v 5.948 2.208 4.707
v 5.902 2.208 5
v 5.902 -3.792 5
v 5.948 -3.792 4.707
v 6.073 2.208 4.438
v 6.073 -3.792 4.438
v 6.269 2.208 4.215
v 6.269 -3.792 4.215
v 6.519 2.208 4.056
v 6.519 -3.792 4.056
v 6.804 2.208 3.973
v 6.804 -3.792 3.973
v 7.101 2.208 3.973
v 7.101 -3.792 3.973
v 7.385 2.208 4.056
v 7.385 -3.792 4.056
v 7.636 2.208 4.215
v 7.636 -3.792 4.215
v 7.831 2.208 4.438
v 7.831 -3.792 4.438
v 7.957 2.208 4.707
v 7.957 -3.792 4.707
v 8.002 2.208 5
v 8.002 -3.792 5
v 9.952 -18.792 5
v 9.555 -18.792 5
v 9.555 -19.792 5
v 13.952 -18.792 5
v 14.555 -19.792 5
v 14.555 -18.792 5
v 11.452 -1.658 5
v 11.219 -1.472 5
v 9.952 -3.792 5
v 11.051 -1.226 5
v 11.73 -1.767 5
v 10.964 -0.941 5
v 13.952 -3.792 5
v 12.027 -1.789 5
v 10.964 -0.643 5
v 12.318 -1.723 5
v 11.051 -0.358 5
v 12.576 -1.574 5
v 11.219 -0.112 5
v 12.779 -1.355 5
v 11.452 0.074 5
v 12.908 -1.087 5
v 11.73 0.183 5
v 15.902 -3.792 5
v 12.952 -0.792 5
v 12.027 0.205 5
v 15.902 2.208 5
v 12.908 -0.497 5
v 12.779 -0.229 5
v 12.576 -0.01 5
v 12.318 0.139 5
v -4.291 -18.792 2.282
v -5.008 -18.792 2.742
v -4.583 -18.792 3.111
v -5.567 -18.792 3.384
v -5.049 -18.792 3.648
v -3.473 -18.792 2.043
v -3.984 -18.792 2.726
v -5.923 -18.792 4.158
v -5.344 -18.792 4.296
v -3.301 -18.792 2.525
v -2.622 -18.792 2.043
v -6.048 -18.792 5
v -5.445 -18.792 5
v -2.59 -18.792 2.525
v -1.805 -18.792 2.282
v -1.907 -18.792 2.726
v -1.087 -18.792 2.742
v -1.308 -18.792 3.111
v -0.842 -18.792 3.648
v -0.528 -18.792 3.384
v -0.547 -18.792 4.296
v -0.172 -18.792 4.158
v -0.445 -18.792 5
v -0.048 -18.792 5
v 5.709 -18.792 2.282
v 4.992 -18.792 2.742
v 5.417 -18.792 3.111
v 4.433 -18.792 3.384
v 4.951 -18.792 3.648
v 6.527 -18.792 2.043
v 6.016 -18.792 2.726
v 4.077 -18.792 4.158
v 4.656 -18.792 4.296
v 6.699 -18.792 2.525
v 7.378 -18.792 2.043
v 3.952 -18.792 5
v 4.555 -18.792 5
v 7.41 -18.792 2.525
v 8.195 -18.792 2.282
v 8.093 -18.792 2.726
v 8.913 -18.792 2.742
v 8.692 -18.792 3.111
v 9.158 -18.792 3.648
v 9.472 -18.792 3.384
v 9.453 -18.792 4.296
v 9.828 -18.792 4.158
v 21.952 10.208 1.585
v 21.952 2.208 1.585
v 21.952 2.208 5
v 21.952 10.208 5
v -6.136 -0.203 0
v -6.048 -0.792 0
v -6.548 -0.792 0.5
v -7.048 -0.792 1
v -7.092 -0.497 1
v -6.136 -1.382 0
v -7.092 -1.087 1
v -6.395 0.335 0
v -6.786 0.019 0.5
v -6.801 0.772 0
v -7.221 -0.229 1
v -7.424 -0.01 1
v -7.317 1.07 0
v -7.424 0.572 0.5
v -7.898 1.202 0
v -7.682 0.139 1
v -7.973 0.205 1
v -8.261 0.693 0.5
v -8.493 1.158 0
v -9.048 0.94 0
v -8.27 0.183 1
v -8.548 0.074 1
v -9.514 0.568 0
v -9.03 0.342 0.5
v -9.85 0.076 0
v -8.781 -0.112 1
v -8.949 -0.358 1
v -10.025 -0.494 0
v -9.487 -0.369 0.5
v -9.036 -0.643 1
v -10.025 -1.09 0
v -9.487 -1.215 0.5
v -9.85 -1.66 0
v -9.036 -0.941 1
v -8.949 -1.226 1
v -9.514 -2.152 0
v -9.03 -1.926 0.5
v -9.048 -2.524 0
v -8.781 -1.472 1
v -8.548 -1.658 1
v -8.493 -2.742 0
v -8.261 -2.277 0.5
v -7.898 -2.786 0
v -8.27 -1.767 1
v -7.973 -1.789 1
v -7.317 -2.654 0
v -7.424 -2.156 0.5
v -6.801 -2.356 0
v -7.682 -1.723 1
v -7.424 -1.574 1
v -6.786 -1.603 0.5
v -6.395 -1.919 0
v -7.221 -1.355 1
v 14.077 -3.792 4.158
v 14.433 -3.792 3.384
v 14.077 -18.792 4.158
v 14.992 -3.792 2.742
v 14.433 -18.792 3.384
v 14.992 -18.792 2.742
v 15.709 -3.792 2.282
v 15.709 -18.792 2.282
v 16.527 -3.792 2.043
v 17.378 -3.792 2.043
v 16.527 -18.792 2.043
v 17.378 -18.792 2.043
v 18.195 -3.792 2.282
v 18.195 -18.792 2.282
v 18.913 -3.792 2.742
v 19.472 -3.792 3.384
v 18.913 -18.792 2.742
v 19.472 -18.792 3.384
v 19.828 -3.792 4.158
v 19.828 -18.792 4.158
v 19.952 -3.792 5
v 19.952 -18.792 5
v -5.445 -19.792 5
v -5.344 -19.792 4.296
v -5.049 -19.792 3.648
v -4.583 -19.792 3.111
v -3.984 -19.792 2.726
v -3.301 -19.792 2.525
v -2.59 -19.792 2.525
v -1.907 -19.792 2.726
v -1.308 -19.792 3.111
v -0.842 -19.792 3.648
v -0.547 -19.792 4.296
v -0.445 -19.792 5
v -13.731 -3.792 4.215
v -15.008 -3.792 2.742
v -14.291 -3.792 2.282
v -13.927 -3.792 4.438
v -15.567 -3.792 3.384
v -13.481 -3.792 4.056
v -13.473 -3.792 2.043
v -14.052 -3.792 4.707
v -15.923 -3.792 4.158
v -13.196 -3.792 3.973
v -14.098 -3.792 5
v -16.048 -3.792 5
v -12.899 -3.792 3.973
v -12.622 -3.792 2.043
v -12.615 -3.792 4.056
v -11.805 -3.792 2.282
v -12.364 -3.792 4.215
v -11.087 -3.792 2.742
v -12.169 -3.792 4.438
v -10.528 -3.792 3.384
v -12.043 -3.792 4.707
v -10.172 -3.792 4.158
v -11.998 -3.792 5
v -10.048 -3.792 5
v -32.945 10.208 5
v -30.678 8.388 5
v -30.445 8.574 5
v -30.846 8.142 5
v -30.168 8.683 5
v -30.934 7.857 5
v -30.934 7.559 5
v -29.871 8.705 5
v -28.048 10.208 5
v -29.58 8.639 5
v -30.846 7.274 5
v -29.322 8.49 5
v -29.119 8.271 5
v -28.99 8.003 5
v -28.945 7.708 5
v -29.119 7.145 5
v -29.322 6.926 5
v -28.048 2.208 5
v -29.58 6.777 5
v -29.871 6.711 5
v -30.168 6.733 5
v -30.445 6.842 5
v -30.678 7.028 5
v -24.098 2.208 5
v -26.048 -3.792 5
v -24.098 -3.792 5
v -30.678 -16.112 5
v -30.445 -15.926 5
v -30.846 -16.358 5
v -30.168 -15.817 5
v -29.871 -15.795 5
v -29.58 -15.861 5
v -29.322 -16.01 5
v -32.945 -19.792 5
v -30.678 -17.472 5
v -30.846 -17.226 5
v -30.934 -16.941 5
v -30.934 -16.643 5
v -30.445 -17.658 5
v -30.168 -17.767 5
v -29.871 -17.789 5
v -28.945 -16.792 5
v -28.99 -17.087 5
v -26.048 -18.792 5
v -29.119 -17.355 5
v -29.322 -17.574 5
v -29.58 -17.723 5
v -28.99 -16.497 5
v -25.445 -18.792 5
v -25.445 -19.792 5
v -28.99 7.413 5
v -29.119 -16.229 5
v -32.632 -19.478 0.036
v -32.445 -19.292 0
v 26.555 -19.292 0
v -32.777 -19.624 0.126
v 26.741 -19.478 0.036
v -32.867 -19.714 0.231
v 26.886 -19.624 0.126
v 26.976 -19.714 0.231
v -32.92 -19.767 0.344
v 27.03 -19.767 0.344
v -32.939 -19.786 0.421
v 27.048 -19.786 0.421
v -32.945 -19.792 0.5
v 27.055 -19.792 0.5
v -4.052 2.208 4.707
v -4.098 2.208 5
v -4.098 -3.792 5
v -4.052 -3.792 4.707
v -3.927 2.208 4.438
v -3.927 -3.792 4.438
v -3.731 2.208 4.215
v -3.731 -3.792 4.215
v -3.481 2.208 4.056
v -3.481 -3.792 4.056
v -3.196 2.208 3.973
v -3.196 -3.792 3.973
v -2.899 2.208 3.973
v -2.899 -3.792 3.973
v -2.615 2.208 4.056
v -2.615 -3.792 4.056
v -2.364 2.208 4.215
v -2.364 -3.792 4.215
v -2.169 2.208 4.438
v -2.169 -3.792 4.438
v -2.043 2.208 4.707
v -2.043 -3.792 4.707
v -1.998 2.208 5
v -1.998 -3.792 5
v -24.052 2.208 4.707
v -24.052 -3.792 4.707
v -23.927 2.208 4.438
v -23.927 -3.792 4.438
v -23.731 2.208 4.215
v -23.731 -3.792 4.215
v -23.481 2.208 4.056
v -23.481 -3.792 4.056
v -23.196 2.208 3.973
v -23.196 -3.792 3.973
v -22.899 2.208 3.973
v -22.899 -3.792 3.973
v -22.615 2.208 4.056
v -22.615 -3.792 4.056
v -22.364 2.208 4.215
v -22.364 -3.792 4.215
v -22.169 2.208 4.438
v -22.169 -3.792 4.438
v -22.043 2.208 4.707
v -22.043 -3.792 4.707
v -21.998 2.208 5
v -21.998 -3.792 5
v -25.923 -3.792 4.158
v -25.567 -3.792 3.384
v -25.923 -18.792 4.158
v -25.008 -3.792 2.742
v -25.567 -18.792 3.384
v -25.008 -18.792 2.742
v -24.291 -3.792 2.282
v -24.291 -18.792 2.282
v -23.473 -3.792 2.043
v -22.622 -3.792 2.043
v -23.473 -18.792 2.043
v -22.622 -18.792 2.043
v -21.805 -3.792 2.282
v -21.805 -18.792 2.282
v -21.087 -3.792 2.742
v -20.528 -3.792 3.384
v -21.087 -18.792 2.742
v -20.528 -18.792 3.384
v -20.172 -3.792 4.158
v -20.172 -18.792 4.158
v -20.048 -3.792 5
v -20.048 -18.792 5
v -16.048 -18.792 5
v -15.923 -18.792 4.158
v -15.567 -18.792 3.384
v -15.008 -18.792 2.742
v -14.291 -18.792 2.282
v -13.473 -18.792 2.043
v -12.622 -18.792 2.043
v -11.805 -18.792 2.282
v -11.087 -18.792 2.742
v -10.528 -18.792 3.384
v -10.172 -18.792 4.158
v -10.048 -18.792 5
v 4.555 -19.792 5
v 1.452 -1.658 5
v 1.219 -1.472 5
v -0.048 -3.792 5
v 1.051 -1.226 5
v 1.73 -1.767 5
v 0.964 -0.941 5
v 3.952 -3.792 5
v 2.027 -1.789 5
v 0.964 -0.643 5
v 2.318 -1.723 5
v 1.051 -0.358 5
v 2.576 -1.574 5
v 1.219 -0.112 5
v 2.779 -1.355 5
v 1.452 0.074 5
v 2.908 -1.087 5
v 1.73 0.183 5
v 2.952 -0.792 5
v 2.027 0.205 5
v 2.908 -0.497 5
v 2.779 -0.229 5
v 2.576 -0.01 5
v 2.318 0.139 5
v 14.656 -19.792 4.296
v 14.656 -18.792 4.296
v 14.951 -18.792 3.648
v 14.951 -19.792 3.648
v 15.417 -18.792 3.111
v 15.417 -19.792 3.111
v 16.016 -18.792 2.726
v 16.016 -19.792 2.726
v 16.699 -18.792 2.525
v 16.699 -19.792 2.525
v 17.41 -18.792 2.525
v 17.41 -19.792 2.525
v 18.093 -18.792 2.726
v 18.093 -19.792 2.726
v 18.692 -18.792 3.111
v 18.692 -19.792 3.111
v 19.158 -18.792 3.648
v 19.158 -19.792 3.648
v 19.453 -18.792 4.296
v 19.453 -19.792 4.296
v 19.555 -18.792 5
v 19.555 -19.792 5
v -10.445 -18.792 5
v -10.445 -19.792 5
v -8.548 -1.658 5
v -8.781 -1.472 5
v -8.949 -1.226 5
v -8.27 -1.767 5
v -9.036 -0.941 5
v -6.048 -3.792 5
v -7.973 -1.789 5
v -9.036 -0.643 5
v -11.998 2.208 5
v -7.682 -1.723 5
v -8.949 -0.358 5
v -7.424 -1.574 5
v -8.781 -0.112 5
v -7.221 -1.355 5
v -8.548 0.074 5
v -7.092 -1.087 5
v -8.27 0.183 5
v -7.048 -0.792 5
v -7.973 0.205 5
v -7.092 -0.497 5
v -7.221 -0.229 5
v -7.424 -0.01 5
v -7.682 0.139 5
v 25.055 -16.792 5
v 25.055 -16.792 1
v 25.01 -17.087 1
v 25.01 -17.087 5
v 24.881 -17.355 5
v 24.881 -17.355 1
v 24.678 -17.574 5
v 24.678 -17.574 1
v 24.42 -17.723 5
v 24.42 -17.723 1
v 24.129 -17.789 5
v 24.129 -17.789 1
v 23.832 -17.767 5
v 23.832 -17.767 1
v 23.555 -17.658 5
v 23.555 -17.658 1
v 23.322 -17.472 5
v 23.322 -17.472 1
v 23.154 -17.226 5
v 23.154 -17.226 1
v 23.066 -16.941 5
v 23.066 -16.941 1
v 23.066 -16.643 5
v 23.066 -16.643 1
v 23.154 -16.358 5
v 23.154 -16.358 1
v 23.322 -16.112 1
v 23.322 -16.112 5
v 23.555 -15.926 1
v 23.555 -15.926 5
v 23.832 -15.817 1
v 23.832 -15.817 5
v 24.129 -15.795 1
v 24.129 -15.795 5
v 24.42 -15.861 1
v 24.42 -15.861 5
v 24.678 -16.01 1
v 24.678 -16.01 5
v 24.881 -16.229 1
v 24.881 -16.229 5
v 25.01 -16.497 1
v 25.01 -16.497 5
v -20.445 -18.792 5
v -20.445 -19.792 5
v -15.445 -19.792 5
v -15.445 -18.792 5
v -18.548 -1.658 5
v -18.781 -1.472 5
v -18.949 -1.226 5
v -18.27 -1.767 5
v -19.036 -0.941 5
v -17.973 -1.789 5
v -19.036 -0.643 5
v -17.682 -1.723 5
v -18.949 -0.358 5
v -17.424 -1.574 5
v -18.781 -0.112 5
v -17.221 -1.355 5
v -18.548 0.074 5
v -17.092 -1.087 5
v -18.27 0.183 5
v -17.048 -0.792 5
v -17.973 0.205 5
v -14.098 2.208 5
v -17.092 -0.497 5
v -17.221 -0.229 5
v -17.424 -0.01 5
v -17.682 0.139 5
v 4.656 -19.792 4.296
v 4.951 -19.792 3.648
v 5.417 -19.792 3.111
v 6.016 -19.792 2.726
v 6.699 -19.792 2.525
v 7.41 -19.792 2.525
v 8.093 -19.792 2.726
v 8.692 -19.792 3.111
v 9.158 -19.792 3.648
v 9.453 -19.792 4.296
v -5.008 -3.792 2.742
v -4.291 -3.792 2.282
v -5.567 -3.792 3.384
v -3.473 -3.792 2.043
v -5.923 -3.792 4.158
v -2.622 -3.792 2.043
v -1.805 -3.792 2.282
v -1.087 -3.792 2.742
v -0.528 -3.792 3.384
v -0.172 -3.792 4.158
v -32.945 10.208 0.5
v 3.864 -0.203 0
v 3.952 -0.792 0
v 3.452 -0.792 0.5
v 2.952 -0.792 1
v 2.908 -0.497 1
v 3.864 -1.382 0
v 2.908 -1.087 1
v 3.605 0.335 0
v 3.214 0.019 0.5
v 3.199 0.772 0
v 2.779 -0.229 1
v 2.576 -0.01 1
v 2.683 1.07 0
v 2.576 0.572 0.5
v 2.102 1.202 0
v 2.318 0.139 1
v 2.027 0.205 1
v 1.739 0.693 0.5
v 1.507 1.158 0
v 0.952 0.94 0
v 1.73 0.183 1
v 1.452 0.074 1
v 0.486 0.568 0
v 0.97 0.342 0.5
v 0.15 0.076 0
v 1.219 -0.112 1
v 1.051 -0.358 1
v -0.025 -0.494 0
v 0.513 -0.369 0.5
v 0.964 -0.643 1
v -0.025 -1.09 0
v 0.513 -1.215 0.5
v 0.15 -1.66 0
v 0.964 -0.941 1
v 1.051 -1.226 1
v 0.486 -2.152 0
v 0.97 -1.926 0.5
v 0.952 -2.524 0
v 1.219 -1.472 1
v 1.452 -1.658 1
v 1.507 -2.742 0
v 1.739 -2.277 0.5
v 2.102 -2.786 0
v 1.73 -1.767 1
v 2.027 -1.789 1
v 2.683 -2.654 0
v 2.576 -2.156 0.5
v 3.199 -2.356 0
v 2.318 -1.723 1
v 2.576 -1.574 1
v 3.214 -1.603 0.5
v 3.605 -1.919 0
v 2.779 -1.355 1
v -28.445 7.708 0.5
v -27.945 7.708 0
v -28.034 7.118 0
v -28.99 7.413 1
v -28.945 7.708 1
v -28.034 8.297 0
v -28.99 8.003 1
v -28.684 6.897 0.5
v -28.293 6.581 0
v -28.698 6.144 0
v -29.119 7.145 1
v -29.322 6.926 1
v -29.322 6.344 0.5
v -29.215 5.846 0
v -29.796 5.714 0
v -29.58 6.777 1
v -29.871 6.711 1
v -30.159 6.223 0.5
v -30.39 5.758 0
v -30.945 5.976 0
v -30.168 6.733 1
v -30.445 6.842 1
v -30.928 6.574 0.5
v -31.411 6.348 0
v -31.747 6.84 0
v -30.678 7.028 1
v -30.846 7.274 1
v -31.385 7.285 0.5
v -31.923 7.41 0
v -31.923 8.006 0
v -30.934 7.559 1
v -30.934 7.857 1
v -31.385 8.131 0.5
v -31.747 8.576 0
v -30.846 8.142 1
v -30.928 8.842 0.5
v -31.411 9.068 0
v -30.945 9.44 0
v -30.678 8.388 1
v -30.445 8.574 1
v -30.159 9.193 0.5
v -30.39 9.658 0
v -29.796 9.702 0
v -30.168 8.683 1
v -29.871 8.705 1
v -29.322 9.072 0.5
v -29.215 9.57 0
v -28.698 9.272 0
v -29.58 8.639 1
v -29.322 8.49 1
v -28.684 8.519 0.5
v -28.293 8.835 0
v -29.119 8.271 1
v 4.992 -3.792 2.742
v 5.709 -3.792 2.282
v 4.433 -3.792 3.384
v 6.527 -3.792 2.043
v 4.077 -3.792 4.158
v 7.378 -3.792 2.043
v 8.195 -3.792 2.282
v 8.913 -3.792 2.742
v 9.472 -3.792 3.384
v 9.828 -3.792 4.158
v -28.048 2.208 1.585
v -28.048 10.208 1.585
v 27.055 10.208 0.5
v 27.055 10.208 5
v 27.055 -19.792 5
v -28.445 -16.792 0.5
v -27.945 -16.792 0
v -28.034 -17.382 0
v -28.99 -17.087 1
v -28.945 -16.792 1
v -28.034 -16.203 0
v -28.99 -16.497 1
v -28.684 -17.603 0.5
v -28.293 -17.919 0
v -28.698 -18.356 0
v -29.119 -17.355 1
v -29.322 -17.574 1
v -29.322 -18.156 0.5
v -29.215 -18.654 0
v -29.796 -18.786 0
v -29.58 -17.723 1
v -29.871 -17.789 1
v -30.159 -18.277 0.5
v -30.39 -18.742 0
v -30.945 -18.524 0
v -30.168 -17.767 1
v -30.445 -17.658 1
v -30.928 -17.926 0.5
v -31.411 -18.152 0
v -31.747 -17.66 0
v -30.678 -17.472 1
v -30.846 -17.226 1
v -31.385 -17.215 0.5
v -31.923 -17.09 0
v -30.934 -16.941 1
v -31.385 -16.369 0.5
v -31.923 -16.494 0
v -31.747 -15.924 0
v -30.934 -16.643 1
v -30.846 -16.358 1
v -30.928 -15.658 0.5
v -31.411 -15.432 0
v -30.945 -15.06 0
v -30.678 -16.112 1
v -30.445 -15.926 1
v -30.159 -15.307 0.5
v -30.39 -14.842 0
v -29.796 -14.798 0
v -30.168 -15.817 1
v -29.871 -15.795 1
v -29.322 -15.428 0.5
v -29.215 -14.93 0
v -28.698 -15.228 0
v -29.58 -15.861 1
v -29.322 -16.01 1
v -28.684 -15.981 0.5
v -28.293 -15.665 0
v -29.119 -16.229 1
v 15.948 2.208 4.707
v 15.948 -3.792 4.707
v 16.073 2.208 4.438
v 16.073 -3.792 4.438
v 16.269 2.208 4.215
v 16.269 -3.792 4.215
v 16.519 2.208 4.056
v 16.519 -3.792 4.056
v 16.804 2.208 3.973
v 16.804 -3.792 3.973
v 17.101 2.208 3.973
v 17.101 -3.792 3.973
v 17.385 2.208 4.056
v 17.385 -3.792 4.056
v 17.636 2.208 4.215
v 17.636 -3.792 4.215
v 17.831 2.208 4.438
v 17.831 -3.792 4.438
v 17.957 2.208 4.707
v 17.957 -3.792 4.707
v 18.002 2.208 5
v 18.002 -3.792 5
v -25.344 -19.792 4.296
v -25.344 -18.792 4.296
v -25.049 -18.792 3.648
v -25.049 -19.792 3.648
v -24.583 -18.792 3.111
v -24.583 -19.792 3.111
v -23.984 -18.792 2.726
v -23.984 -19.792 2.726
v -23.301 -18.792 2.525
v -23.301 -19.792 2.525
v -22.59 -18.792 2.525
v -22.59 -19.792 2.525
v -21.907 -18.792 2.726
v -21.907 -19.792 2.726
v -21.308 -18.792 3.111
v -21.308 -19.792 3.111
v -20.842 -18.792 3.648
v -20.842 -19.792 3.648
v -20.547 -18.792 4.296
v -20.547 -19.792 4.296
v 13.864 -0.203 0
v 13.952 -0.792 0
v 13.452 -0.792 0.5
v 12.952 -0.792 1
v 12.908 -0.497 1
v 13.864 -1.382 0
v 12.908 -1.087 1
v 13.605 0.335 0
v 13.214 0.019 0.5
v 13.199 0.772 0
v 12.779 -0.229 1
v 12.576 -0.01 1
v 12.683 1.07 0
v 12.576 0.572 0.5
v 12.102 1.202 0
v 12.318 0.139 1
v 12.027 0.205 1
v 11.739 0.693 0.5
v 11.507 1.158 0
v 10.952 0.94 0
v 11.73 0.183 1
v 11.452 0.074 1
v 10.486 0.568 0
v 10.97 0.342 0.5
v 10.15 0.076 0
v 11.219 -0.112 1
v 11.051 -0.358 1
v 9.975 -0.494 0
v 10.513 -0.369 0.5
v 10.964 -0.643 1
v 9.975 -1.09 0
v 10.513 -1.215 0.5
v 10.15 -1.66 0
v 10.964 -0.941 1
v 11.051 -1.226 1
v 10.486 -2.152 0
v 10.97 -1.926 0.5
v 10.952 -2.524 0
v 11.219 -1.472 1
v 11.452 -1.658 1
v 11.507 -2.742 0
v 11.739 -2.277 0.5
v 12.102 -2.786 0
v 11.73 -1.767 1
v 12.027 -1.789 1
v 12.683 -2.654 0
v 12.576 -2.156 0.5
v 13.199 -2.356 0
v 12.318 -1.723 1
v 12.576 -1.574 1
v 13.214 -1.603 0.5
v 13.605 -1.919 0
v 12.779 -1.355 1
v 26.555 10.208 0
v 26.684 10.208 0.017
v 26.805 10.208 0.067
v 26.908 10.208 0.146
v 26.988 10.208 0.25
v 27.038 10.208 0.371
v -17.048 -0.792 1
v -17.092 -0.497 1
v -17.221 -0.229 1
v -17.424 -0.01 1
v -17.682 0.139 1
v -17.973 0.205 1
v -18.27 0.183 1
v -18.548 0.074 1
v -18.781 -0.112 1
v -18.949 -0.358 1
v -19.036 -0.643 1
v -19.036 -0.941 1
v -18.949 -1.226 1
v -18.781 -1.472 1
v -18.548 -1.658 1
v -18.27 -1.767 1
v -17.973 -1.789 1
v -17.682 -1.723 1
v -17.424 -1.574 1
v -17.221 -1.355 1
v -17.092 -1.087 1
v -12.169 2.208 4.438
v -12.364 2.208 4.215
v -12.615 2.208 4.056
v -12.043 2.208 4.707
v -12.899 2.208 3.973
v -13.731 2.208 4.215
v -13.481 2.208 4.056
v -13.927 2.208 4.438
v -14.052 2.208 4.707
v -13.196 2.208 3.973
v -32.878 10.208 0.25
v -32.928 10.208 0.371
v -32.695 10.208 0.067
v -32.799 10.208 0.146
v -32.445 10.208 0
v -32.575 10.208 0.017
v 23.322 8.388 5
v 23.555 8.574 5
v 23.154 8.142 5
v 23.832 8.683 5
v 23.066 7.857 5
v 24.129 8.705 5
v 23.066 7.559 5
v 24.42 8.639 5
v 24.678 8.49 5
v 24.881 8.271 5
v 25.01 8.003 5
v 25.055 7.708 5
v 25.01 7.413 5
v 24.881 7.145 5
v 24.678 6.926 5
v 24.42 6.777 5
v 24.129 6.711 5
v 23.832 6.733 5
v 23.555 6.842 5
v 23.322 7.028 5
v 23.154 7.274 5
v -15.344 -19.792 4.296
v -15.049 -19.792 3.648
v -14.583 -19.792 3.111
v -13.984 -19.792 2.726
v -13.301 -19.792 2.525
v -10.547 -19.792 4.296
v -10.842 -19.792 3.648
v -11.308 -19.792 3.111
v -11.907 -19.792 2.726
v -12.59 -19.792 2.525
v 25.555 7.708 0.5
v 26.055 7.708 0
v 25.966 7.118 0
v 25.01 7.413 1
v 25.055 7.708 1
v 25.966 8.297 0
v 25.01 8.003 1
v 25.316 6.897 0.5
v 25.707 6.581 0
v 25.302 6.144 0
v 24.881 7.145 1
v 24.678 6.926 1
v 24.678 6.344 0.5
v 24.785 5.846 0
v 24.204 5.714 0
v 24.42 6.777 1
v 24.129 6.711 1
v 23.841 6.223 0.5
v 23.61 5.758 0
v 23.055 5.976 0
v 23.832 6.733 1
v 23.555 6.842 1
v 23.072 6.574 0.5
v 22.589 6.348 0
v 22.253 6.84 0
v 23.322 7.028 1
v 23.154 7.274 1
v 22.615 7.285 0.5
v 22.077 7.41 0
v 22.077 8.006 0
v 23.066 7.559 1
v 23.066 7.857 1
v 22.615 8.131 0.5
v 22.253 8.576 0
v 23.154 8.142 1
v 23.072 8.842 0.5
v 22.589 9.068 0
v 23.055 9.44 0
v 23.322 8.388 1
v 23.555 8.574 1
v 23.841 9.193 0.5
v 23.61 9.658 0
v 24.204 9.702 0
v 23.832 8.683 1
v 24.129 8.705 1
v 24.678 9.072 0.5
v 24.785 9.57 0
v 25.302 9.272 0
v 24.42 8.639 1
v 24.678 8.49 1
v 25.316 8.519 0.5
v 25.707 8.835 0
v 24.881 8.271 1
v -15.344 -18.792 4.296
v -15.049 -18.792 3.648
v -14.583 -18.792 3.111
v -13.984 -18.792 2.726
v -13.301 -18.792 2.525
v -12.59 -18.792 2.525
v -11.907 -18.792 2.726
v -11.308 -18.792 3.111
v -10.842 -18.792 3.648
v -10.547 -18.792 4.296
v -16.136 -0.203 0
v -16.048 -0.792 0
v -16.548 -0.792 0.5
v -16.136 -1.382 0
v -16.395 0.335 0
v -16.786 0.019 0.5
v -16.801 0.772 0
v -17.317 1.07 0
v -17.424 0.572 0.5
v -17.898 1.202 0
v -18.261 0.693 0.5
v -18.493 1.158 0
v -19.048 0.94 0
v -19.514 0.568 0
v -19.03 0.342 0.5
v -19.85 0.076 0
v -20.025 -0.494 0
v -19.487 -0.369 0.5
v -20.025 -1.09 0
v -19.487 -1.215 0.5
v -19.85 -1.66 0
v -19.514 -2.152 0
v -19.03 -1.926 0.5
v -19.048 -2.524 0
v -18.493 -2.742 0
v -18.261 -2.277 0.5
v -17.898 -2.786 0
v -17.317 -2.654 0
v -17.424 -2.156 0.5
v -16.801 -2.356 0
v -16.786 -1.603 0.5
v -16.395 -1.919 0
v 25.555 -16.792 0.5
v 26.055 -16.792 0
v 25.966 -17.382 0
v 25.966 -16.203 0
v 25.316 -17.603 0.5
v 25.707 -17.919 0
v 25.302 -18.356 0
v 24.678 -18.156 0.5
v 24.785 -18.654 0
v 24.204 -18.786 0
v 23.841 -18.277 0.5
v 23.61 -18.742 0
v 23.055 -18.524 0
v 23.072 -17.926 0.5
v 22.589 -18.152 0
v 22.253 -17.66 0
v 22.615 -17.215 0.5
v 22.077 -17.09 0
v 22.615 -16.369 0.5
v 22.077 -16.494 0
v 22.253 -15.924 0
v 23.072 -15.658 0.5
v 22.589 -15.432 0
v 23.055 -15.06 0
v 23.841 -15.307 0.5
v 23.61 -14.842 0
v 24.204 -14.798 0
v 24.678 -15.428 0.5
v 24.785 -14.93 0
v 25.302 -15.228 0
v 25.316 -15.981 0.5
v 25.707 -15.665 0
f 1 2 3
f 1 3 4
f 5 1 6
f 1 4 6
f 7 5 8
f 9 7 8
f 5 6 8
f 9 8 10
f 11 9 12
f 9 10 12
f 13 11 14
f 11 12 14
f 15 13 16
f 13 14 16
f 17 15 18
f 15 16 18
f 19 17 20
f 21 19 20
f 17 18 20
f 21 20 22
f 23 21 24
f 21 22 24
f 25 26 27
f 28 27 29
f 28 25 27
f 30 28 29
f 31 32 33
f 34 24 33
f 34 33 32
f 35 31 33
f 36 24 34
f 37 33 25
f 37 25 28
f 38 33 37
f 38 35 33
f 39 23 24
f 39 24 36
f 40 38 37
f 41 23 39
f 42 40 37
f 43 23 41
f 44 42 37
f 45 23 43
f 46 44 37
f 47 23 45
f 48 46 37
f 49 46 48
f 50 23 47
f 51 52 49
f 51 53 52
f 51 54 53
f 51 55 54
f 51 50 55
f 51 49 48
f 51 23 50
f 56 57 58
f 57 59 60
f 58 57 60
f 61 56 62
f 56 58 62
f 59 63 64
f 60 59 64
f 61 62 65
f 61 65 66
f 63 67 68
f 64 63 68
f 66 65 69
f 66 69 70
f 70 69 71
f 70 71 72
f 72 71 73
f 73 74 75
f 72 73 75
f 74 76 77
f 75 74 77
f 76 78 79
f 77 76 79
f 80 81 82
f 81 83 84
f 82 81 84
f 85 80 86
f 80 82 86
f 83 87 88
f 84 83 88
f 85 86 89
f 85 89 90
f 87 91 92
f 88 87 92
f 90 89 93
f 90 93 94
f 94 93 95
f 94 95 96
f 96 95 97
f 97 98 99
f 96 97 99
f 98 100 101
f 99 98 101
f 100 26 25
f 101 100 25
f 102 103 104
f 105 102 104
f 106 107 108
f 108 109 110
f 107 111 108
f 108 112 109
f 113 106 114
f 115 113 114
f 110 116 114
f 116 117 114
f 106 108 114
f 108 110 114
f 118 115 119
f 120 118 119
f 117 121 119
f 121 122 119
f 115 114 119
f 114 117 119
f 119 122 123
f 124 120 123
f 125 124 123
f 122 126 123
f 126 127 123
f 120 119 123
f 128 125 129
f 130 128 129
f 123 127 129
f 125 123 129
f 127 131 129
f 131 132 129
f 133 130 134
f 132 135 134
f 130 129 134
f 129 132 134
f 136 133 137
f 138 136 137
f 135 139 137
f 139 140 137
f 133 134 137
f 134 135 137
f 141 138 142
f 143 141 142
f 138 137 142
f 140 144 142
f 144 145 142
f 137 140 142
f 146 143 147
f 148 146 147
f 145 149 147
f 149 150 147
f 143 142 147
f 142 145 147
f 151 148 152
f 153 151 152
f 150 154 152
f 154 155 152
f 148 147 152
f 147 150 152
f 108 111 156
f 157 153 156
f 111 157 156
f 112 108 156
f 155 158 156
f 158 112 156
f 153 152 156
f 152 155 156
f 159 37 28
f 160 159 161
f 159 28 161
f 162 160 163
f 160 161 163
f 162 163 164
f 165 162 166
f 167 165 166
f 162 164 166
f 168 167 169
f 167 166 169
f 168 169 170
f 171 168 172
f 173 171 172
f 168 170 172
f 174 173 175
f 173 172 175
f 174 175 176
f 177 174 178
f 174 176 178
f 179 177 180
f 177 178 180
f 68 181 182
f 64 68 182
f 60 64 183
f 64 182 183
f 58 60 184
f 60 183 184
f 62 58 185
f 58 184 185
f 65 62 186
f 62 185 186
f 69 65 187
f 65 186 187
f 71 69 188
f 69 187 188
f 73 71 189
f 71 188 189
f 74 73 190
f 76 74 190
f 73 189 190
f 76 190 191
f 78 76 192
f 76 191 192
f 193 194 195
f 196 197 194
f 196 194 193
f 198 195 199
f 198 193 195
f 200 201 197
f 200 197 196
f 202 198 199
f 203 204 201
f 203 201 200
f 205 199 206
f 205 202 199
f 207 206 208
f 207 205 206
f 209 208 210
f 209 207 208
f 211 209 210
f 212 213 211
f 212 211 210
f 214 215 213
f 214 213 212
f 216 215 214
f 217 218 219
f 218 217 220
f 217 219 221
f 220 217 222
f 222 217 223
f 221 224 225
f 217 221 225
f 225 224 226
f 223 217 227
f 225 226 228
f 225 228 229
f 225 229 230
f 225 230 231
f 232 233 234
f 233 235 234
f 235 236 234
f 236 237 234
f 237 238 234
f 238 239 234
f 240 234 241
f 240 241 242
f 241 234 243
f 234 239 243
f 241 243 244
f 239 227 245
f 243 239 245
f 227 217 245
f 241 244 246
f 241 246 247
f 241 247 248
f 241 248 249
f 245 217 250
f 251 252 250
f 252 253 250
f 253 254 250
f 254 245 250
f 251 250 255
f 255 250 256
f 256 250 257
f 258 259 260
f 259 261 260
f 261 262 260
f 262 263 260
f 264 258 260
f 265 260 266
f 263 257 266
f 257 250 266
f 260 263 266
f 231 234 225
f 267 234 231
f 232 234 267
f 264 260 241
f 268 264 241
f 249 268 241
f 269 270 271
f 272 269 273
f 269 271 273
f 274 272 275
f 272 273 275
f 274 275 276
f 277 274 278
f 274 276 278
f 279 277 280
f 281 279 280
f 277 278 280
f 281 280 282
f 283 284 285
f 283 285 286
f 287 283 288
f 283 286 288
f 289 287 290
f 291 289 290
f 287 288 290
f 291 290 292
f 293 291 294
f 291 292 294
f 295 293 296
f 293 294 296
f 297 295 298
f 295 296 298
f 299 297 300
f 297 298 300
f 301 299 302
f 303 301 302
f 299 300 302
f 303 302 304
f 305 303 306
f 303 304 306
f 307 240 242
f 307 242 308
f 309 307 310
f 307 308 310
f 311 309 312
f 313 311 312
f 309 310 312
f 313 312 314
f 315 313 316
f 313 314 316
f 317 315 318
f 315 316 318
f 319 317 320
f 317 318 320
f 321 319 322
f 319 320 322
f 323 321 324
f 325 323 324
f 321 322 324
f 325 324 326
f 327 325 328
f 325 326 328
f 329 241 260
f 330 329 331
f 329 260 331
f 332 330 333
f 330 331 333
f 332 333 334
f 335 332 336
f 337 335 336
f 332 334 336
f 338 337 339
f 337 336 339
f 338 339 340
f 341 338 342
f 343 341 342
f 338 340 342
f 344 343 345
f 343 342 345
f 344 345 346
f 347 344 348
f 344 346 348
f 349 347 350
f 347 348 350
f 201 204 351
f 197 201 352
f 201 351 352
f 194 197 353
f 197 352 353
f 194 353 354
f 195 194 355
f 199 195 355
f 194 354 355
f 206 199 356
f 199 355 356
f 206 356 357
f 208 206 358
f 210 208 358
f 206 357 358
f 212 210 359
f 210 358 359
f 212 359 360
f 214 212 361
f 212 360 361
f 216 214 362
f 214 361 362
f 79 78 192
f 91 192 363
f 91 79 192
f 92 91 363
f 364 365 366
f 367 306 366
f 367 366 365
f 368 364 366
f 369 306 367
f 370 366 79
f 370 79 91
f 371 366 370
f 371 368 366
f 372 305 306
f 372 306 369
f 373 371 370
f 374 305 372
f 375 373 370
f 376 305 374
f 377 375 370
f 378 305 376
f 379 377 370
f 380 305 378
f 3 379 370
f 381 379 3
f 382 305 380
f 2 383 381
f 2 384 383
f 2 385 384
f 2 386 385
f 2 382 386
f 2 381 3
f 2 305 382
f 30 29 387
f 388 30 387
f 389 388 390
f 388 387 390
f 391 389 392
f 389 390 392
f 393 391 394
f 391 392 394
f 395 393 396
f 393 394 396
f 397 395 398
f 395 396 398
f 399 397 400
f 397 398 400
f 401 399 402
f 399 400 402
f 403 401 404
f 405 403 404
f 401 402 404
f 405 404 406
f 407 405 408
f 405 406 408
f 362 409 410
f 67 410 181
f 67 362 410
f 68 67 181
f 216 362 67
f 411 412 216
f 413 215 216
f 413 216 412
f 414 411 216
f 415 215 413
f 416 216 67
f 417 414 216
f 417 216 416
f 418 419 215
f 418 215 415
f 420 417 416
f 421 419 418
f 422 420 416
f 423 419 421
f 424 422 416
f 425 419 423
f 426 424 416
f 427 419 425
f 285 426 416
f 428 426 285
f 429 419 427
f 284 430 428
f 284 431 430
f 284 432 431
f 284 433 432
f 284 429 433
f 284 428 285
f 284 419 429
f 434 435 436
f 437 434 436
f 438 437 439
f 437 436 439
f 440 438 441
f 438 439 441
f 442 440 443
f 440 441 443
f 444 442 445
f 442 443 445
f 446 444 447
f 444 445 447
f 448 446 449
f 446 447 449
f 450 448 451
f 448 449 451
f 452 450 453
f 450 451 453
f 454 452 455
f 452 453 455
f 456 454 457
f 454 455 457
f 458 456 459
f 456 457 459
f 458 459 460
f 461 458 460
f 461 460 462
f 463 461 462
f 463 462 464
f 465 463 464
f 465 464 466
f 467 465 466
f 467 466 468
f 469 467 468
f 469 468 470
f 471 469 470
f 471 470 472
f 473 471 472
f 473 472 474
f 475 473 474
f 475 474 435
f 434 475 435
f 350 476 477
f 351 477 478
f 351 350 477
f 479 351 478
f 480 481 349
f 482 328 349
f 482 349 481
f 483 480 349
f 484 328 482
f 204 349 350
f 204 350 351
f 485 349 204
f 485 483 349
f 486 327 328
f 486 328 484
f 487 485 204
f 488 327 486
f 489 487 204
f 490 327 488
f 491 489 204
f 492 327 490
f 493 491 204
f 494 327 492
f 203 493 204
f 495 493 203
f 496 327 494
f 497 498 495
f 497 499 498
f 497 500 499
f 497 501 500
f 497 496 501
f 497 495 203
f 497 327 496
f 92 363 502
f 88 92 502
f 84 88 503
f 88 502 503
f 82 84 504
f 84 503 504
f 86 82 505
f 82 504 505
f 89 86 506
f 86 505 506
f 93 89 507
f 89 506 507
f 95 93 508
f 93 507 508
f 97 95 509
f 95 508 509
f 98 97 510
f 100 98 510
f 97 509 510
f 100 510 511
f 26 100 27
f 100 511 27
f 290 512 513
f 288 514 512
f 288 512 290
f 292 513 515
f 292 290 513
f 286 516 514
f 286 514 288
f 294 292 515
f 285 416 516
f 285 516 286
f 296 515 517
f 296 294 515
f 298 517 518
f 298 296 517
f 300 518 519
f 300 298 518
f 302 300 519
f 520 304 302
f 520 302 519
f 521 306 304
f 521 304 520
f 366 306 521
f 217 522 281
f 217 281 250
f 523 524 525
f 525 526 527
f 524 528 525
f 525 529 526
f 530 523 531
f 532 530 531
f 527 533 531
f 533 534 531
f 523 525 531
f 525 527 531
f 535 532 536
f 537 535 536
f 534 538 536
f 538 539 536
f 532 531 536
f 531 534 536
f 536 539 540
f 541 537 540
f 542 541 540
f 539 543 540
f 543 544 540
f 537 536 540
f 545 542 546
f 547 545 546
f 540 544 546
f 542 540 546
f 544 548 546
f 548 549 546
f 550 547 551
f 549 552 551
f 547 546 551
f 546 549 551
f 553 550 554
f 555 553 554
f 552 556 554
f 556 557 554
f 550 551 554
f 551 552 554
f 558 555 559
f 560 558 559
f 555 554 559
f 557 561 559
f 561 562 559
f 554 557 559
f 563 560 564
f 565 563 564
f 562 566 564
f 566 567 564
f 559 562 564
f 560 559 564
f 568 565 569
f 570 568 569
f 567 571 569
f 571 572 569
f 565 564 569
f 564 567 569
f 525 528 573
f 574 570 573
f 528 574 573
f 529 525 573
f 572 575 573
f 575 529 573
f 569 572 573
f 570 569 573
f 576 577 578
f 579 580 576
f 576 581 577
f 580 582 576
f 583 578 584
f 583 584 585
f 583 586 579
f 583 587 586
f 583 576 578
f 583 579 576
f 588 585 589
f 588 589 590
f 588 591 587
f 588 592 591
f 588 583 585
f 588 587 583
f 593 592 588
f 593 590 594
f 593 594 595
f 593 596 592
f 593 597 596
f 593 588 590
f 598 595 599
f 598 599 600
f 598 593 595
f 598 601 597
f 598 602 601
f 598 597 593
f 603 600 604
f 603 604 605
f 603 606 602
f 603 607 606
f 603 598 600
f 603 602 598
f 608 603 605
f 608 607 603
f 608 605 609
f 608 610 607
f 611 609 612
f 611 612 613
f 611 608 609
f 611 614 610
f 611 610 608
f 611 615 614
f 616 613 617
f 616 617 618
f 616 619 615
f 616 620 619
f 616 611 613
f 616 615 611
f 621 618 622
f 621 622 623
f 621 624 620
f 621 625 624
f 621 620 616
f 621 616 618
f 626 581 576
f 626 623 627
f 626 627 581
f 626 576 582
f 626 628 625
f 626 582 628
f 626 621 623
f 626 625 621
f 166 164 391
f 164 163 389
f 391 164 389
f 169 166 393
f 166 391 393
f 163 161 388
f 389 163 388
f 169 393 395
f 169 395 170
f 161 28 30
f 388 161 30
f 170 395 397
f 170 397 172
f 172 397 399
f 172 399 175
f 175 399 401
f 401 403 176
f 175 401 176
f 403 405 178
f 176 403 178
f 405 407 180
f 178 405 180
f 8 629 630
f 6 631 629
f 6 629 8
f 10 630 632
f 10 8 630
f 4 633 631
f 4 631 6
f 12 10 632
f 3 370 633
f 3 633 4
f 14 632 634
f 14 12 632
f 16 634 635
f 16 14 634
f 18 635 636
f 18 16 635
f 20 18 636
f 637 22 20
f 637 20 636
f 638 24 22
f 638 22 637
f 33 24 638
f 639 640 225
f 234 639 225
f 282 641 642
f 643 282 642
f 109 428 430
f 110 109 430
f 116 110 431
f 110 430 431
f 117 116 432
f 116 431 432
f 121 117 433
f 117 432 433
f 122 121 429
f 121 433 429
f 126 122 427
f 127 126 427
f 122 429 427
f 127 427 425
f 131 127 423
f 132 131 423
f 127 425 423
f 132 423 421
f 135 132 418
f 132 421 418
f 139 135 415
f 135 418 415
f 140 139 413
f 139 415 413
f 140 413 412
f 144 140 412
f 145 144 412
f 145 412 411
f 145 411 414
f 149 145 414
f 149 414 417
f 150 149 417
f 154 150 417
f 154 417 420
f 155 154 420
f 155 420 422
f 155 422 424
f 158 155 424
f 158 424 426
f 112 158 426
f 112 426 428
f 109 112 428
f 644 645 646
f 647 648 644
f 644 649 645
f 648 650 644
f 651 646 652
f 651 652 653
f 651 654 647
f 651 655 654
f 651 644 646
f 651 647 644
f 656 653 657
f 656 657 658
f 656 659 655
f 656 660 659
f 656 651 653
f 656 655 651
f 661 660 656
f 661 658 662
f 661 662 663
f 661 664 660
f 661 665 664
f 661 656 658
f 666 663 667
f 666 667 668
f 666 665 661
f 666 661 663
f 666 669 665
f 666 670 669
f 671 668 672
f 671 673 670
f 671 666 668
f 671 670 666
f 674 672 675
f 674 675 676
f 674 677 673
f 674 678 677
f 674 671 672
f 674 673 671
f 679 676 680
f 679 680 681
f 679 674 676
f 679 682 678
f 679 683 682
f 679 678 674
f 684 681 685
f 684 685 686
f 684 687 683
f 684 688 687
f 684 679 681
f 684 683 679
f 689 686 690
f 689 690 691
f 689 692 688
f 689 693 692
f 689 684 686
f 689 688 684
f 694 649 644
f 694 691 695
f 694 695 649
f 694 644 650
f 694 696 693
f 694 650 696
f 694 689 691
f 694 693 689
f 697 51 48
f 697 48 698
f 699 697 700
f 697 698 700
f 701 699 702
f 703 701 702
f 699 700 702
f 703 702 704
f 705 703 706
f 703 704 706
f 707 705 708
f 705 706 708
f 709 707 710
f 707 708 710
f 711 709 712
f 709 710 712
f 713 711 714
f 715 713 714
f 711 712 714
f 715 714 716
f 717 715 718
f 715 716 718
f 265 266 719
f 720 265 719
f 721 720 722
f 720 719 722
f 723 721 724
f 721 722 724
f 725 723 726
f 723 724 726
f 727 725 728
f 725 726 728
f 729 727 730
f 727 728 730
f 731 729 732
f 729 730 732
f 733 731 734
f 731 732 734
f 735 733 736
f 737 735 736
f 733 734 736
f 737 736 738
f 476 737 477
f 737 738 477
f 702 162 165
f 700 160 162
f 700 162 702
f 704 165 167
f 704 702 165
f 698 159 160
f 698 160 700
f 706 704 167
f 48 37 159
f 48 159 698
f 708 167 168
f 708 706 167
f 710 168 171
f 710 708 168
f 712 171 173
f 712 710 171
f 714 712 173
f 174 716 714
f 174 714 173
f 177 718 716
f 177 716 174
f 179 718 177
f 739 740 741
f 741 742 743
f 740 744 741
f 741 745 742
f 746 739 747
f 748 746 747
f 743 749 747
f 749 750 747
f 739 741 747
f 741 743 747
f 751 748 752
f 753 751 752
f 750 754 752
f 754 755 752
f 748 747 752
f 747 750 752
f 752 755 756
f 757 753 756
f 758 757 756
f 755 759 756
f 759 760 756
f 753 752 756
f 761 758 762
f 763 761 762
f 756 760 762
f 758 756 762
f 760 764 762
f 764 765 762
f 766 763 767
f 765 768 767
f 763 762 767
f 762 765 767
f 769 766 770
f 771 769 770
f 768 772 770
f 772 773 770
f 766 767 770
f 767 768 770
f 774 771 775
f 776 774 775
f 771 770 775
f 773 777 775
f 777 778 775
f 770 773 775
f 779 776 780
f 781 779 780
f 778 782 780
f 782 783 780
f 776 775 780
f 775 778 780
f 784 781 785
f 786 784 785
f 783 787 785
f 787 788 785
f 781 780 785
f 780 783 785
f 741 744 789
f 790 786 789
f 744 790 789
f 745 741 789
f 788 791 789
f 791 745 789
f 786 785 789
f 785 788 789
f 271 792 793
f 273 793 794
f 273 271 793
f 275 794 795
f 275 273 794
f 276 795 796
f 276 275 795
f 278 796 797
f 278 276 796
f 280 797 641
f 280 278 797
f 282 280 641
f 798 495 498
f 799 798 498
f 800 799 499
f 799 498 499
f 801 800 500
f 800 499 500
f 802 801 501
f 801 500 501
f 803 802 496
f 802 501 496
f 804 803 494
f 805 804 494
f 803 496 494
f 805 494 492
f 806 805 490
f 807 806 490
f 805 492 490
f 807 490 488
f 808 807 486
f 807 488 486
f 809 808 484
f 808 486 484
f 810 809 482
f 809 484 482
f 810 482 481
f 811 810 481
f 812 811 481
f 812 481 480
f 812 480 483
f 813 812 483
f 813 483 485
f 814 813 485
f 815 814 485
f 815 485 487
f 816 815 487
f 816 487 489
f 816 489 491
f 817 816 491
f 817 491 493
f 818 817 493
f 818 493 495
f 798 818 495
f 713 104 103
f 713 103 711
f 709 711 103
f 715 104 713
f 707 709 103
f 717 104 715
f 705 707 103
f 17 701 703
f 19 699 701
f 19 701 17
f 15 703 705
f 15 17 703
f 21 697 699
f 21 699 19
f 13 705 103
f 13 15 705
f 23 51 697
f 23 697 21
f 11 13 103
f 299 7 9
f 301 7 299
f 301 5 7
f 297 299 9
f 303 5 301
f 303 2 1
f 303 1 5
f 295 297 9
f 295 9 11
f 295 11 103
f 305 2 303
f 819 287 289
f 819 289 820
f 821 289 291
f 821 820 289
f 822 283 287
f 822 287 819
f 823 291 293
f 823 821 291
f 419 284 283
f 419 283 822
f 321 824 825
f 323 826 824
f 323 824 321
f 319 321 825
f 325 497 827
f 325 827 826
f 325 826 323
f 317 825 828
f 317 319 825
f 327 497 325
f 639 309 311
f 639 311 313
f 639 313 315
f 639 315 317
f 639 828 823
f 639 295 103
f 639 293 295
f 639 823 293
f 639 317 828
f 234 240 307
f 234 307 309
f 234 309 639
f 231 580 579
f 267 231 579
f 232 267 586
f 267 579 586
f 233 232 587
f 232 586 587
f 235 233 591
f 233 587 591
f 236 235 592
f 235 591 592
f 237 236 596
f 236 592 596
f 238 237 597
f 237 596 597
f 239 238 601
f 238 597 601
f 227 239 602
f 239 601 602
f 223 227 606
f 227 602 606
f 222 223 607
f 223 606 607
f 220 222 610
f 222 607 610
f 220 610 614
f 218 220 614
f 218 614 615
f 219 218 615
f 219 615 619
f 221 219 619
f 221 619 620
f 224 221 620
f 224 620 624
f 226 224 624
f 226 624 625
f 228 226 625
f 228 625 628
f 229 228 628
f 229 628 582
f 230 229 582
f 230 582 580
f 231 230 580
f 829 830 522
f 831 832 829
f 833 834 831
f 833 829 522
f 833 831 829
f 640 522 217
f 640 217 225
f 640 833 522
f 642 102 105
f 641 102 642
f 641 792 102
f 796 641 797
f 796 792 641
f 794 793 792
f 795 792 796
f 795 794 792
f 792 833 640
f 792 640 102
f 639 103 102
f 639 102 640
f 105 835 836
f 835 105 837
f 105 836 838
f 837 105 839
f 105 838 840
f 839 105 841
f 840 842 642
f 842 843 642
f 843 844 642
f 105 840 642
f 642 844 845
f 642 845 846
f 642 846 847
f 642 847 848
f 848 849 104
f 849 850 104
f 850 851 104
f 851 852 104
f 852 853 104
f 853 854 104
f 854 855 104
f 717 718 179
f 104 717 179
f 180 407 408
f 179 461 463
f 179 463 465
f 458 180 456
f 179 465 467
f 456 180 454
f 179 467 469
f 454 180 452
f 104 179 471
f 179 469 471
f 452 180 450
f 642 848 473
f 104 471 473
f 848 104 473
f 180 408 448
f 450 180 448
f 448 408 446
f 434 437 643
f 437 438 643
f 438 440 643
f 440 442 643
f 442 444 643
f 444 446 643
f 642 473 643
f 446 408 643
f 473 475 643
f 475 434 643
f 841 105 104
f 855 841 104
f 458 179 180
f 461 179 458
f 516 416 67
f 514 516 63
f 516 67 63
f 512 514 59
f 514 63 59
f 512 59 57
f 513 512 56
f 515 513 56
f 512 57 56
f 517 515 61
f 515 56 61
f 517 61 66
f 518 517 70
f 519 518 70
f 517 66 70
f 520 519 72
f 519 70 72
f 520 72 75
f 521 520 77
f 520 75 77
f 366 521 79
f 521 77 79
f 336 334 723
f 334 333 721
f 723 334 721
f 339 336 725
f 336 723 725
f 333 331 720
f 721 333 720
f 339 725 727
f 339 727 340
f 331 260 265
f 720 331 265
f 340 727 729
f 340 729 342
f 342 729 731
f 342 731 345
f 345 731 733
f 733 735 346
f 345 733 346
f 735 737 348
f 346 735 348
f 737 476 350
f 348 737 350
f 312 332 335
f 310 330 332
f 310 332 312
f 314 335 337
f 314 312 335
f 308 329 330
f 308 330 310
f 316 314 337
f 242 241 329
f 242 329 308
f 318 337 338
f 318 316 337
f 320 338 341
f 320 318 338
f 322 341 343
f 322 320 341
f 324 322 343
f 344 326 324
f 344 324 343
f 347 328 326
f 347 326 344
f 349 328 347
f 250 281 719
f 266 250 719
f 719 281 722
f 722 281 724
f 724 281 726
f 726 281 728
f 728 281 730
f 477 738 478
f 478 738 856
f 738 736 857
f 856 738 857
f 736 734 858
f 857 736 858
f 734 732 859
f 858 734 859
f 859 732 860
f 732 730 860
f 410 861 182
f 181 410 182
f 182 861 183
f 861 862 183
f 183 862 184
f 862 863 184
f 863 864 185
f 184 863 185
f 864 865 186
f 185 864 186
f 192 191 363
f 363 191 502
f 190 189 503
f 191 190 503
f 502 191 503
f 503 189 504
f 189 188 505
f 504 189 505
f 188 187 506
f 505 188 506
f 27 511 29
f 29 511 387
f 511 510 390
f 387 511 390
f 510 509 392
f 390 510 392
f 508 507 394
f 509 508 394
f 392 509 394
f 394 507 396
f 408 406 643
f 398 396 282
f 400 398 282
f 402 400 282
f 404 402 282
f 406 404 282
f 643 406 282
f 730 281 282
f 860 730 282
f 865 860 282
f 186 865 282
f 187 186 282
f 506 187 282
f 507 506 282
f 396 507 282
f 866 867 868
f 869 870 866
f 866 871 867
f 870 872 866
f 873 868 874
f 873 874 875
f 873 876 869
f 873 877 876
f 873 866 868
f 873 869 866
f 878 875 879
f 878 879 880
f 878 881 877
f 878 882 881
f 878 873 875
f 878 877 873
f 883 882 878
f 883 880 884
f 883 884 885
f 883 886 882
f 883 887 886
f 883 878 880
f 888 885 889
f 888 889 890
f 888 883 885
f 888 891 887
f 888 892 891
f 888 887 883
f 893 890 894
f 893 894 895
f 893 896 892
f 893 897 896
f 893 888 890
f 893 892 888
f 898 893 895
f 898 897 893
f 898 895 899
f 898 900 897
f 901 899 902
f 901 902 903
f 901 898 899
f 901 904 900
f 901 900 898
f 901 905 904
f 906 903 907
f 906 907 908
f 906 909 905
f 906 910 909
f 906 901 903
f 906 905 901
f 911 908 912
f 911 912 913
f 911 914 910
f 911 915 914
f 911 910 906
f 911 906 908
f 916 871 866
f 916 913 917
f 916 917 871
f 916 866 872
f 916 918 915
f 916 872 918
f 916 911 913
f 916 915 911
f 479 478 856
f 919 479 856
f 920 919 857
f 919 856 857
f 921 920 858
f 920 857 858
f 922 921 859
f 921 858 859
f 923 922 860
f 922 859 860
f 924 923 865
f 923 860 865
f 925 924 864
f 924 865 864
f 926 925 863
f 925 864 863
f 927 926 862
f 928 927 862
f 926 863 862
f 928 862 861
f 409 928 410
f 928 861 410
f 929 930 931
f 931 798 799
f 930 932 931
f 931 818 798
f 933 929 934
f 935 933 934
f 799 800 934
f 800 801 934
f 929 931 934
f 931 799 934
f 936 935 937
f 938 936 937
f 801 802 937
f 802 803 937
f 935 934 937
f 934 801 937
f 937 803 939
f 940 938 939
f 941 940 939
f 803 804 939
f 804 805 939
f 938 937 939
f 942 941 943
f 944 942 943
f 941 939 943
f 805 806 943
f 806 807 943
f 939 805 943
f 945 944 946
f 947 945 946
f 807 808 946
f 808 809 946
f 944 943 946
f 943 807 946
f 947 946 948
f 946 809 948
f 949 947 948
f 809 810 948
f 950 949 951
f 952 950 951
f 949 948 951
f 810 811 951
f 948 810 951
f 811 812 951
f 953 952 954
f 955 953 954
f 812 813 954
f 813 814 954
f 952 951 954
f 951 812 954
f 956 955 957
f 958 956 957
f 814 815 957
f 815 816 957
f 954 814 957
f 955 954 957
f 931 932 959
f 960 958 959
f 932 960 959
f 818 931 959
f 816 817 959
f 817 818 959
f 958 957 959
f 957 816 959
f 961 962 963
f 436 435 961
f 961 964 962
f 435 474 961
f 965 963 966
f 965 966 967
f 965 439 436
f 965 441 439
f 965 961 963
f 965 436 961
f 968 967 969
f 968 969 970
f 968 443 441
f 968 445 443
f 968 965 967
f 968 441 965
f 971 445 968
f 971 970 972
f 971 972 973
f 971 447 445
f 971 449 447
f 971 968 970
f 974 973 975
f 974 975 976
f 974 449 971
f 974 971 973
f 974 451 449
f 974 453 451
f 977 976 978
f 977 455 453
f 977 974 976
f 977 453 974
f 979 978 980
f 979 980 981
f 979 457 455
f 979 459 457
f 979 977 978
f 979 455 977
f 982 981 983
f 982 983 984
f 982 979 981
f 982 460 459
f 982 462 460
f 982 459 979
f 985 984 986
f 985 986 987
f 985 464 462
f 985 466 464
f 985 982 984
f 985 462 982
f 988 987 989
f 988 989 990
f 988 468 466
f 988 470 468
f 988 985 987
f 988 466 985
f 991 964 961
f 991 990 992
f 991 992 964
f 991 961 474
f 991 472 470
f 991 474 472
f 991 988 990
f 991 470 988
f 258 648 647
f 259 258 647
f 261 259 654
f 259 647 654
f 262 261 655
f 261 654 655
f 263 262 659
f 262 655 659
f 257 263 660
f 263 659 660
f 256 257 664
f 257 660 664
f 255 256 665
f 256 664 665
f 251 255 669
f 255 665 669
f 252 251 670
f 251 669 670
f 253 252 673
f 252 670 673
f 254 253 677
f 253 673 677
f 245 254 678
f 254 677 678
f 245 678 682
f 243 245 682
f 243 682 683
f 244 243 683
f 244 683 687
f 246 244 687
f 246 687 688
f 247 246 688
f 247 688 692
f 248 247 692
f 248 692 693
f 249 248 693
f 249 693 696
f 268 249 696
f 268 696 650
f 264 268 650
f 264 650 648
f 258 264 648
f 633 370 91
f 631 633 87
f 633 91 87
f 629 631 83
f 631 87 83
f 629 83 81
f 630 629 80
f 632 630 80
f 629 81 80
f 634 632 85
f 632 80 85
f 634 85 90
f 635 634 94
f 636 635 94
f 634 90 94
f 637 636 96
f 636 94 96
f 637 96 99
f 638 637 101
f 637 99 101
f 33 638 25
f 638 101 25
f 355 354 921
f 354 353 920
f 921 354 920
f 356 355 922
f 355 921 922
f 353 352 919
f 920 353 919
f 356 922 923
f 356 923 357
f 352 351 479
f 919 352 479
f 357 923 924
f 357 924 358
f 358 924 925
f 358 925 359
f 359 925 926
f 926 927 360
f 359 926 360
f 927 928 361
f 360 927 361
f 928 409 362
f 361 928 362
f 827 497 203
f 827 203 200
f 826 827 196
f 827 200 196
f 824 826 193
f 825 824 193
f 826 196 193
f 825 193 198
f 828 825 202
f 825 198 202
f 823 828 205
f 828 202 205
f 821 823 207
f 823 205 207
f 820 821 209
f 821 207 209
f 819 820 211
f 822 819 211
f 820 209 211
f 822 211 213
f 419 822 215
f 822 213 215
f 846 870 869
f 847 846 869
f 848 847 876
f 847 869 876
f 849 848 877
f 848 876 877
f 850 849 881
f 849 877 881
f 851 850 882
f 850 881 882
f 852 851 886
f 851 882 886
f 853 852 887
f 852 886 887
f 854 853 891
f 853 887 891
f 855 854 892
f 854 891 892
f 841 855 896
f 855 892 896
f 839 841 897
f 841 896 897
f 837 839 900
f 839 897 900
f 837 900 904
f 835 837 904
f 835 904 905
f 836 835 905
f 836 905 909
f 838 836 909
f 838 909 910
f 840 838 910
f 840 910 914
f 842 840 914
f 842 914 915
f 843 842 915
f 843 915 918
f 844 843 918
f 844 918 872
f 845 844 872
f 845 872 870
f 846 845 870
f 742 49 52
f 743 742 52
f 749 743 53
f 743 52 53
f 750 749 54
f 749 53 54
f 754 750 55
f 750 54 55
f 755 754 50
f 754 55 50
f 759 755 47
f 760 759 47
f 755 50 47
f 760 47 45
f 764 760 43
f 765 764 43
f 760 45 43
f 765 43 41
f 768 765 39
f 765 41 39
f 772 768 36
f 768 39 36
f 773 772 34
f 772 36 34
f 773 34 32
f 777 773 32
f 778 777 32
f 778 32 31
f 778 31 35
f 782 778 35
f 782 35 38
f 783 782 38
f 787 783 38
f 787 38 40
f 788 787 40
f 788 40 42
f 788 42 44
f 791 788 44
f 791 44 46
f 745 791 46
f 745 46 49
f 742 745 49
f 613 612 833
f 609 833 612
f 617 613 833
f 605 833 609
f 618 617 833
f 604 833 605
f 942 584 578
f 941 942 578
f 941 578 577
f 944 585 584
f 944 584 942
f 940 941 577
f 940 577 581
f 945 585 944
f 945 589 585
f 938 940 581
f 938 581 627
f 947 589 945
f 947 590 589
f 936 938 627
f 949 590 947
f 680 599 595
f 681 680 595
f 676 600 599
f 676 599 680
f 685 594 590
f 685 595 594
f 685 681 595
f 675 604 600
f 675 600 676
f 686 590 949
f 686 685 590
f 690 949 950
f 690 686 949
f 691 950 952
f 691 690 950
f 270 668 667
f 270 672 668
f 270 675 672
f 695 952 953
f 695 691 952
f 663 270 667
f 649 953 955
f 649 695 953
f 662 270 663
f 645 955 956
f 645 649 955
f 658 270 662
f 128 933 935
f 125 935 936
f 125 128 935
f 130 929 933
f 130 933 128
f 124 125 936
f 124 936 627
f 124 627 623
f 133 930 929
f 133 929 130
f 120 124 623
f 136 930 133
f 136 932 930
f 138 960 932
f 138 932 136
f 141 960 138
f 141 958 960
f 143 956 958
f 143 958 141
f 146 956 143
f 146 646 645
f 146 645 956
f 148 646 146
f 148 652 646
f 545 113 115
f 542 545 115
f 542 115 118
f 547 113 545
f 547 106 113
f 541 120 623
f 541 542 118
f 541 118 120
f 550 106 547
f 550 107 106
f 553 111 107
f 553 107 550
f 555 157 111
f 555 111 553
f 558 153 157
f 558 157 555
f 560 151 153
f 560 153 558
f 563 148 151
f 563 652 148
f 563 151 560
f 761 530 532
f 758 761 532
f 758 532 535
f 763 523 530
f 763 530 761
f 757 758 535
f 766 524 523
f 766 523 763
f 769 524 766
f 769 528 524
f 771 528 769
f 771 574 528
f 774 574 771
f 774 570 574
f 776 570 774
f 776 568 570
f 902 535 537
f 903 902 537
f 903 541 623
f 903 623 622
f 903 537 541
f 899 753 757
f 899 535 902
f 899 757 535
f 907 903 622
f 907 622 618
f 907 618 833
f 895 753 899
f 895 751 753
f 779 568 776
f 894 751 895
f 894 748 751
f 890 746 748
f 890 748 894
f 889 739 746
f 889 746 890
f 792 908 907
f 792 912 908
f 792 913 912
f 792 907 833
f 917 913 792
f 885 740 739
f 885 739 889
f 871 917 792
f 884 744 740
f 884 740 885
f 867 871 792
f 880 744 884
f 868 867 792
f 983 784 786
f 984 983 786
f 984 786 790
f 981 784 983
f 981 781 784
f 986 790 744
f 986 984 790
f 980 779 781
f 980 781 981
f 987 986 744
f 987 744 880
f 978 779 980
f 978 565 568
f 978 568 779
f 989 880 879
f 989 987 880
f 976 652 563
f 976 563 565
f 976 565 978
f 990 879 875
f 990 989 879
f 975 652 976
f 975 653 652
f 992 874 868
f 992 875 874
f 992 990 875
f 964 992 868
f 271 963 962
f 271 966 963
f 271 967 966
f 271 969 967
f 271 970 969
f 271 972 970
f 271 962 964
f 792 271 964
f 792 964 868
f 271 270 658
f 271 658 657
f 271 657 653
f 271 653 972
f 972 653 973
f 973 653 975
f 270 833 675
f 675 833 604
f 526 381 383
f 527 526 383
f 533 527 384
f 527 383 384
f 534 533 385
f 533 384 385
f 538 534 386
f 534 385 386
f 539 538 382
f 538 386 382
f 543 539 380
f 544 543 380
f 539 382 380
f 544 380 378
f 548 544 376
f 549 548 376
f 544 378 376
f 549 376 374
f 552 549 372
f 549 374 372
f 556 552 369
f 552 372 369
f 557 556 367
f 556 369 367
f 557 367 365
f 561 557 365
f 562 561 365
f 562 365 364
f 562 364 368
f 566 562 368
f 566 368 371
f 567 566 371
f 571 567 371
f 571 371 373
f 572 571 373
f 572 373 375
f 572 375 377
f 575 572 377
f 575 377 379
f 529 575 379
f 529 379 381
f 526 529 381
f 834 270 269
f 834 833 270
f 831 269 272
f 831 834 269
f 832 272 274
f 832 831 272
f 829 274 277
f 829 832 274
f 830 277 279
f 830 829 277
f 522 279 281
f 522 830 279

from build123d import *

# Parameters (mm, degrees)
F0_W      = 60
F0_H      = 25
F1_DEPTH  = 5
F2_R      = 2.5
F3_DEPTH  = 10
F5_R      = 3
F6_DEPTH  = 15
F7_R      = 1.05
F8_DEPTH  = 29
F9_W      = 50
F9_H      = 3.4154356362
F10_DEPTH = 3
F11_DEPTH = 5
F12_R     = 0.5
F14_R     = 1
F13_R     = 1
F15_DEPTH = 5.001
F16_R     = 1
F17_DEPTH = 5.001
F18_SIZE  = 1


with BuildPart() as f1:
    # F0 (on Top) → F1 (new body)
    with BuildSketch(Plane.XY):
        with Locations((-2.9453901201, -7.2920476746)):
            Rectangle(F0_W, F0_H)
    extrude(amount=F1_DEPTH)

    # F2 (on face) → F3 (cut)
    with BuildSketch(Plane.XZ.offset(19.7920476746)):
        with Locations((-22.9453901201, 5)):
            Circle(F2_R)
        with Locations((-12.9453901201, 5)):
            Circle(F2_R)
        with Locations((-2.9453901201, 5)):
            Circle(F2_R)
        with Locations((7.0546098799, 5)):
            Circle(F2_R)
        with Locations((17.0546098799, 5)):
            Circle(F2_R)
    extrude(amount=-F3_DEPTH, mode=Mode.SUBTRACT)

    # F5 (on offset) → F6 (cut)
    with BuildSketch(Plane.XZ.offset(18.7920476746)):
        with Locations((-23.0476632714, 5.0127296709)):
            Circle(F5_R)
        with Locations((-13.0476632714, 5.0127296709)):
            Circle(F5_R)
        with Locations((-3.0476632714, 5.0127296709)):
            Circle(F5_R)
        with Locations((6.9523367286, 5.0127296709)):
            Circle(F5_R)
        with Locations((16.9523367286, 5.0127296709)):
            Circle(F5_R)
    extrude(amount=-F6_DEPTH, mode=Mode.SUBTRACT)

    # F7 (on face) → F8 (cut)
    with BuildSketch(Plane.XZ.offset(3.7920476746)):
        with Locations((-23.0476632714, 5.0127296709)):
            Circle(F7_R)
        with Locations((-13.0476632714, 5.0127296709)):
            Circle(F7_R)
        with Locations((-3.0476632714, 5.0127296709)):
            Circle(F7_R)
        with Locations((6.9523367286, 5.0127296709)):
            Circle(F7_R)
        with Locations((16.9523367286, 5.0127296709)):
            Circle(F7_R)
    extrude(amount=-F8_DEPTH, mode=Mode.SUBTRACT)

    # F9 (on face) → F10 (cut)
    with BuildSketch(Plane(origin=(0, 5.2079523254, 0), x_dir=(-1, 0, 0), z_dir=(0, 1, 0))):
        with Locations((3.0476632714, 3.2922821819)):
            Rectangle(F9_W, F9_H)
    extrude(amount=-F10_DEPTH, mode=Mode.SUBTRACT)

    # F11 (add): a face of the model
    f11_faces = [f1.faces().sort_by_distance(p)[0] for p in [
        (-2.8102387692, 5.2079523254, 1.4530193808),
    ]]
    extrude(f11_faces, amount=F11_DEPTH)

    # F12
    f12_edges = [f1.edges().sort_by_distance(p)[0] for p in [
        (27.05461, -4.792048, 0),
        (-2.94539, -19.792048, 0),
        (-32.94539, -4.792048, 0),
    ]]
    fillet(f12_edges, radius=F12_R)

    # F14 (on face) + F13 (on face) → F15 (cut, through all)
    with BuildSketch(Plane(origin=(0, 0, 0), x_dir=(1, 0, 0), z_dir=(0, 0, -1))):
        with Locations((-29.9453901201, -7.7079523254)):
            Circle(F14_R)
        with Locations((24.0546098799, -7.7079523254)):
            Circle(F14_R)
    with BuildSketch(Plane(origin=(0, 0, 0), x_dir=(1, 0, 0), z_dir=(0, 0, -1))):
        with Locations((-29.9453901201, 16.7920476746)):
            Circle(F13_R)
        with Locations((24.0546098799, 16.7920476746)):
            Circle(F13_R)
    extrude(amount=-F15_DEPTH, mode=Mode.SUBTRACT)

    # F16 (on face) → F17 (cut, through all)
    with BuildSketch(Plane.XY.offset(5)):
        with Locations((11.9524138955, -0.7920476746)):
            Circle(F16_R)
        with Locations((1.9524138955, -0.7920476746)):
            Circle(F16_R)
        with Locations((-8.0475861045, -0.7920476746)):
            Circle(F16_R)
        with Locations((-18.0475861045, -0.7920476746)):
            Circle(F16_R)
    extrude(amount=-F17_DEPTH, mode=Mode.SUBTRACT)

    # F18
    f18_edges = [f1.edges().sort_by_distance(p)[0] for p in [
        (23.05461, 7.707952, 0),
        (10.952414, -0.792048, 0),
        (23.05461, -16.792048, 0),
        (0.952414, -0.792048, 0),
        (-9.047586, -0.792048, 0),
        (-19.047586, -0.792048, 0),
        (-30.94539, 7.707952, 0),
        (-30.94539, -16.792048, 0),
    ]]
    chamfer(f18_edges, length=F18_SIZE)


solid = f1.part
